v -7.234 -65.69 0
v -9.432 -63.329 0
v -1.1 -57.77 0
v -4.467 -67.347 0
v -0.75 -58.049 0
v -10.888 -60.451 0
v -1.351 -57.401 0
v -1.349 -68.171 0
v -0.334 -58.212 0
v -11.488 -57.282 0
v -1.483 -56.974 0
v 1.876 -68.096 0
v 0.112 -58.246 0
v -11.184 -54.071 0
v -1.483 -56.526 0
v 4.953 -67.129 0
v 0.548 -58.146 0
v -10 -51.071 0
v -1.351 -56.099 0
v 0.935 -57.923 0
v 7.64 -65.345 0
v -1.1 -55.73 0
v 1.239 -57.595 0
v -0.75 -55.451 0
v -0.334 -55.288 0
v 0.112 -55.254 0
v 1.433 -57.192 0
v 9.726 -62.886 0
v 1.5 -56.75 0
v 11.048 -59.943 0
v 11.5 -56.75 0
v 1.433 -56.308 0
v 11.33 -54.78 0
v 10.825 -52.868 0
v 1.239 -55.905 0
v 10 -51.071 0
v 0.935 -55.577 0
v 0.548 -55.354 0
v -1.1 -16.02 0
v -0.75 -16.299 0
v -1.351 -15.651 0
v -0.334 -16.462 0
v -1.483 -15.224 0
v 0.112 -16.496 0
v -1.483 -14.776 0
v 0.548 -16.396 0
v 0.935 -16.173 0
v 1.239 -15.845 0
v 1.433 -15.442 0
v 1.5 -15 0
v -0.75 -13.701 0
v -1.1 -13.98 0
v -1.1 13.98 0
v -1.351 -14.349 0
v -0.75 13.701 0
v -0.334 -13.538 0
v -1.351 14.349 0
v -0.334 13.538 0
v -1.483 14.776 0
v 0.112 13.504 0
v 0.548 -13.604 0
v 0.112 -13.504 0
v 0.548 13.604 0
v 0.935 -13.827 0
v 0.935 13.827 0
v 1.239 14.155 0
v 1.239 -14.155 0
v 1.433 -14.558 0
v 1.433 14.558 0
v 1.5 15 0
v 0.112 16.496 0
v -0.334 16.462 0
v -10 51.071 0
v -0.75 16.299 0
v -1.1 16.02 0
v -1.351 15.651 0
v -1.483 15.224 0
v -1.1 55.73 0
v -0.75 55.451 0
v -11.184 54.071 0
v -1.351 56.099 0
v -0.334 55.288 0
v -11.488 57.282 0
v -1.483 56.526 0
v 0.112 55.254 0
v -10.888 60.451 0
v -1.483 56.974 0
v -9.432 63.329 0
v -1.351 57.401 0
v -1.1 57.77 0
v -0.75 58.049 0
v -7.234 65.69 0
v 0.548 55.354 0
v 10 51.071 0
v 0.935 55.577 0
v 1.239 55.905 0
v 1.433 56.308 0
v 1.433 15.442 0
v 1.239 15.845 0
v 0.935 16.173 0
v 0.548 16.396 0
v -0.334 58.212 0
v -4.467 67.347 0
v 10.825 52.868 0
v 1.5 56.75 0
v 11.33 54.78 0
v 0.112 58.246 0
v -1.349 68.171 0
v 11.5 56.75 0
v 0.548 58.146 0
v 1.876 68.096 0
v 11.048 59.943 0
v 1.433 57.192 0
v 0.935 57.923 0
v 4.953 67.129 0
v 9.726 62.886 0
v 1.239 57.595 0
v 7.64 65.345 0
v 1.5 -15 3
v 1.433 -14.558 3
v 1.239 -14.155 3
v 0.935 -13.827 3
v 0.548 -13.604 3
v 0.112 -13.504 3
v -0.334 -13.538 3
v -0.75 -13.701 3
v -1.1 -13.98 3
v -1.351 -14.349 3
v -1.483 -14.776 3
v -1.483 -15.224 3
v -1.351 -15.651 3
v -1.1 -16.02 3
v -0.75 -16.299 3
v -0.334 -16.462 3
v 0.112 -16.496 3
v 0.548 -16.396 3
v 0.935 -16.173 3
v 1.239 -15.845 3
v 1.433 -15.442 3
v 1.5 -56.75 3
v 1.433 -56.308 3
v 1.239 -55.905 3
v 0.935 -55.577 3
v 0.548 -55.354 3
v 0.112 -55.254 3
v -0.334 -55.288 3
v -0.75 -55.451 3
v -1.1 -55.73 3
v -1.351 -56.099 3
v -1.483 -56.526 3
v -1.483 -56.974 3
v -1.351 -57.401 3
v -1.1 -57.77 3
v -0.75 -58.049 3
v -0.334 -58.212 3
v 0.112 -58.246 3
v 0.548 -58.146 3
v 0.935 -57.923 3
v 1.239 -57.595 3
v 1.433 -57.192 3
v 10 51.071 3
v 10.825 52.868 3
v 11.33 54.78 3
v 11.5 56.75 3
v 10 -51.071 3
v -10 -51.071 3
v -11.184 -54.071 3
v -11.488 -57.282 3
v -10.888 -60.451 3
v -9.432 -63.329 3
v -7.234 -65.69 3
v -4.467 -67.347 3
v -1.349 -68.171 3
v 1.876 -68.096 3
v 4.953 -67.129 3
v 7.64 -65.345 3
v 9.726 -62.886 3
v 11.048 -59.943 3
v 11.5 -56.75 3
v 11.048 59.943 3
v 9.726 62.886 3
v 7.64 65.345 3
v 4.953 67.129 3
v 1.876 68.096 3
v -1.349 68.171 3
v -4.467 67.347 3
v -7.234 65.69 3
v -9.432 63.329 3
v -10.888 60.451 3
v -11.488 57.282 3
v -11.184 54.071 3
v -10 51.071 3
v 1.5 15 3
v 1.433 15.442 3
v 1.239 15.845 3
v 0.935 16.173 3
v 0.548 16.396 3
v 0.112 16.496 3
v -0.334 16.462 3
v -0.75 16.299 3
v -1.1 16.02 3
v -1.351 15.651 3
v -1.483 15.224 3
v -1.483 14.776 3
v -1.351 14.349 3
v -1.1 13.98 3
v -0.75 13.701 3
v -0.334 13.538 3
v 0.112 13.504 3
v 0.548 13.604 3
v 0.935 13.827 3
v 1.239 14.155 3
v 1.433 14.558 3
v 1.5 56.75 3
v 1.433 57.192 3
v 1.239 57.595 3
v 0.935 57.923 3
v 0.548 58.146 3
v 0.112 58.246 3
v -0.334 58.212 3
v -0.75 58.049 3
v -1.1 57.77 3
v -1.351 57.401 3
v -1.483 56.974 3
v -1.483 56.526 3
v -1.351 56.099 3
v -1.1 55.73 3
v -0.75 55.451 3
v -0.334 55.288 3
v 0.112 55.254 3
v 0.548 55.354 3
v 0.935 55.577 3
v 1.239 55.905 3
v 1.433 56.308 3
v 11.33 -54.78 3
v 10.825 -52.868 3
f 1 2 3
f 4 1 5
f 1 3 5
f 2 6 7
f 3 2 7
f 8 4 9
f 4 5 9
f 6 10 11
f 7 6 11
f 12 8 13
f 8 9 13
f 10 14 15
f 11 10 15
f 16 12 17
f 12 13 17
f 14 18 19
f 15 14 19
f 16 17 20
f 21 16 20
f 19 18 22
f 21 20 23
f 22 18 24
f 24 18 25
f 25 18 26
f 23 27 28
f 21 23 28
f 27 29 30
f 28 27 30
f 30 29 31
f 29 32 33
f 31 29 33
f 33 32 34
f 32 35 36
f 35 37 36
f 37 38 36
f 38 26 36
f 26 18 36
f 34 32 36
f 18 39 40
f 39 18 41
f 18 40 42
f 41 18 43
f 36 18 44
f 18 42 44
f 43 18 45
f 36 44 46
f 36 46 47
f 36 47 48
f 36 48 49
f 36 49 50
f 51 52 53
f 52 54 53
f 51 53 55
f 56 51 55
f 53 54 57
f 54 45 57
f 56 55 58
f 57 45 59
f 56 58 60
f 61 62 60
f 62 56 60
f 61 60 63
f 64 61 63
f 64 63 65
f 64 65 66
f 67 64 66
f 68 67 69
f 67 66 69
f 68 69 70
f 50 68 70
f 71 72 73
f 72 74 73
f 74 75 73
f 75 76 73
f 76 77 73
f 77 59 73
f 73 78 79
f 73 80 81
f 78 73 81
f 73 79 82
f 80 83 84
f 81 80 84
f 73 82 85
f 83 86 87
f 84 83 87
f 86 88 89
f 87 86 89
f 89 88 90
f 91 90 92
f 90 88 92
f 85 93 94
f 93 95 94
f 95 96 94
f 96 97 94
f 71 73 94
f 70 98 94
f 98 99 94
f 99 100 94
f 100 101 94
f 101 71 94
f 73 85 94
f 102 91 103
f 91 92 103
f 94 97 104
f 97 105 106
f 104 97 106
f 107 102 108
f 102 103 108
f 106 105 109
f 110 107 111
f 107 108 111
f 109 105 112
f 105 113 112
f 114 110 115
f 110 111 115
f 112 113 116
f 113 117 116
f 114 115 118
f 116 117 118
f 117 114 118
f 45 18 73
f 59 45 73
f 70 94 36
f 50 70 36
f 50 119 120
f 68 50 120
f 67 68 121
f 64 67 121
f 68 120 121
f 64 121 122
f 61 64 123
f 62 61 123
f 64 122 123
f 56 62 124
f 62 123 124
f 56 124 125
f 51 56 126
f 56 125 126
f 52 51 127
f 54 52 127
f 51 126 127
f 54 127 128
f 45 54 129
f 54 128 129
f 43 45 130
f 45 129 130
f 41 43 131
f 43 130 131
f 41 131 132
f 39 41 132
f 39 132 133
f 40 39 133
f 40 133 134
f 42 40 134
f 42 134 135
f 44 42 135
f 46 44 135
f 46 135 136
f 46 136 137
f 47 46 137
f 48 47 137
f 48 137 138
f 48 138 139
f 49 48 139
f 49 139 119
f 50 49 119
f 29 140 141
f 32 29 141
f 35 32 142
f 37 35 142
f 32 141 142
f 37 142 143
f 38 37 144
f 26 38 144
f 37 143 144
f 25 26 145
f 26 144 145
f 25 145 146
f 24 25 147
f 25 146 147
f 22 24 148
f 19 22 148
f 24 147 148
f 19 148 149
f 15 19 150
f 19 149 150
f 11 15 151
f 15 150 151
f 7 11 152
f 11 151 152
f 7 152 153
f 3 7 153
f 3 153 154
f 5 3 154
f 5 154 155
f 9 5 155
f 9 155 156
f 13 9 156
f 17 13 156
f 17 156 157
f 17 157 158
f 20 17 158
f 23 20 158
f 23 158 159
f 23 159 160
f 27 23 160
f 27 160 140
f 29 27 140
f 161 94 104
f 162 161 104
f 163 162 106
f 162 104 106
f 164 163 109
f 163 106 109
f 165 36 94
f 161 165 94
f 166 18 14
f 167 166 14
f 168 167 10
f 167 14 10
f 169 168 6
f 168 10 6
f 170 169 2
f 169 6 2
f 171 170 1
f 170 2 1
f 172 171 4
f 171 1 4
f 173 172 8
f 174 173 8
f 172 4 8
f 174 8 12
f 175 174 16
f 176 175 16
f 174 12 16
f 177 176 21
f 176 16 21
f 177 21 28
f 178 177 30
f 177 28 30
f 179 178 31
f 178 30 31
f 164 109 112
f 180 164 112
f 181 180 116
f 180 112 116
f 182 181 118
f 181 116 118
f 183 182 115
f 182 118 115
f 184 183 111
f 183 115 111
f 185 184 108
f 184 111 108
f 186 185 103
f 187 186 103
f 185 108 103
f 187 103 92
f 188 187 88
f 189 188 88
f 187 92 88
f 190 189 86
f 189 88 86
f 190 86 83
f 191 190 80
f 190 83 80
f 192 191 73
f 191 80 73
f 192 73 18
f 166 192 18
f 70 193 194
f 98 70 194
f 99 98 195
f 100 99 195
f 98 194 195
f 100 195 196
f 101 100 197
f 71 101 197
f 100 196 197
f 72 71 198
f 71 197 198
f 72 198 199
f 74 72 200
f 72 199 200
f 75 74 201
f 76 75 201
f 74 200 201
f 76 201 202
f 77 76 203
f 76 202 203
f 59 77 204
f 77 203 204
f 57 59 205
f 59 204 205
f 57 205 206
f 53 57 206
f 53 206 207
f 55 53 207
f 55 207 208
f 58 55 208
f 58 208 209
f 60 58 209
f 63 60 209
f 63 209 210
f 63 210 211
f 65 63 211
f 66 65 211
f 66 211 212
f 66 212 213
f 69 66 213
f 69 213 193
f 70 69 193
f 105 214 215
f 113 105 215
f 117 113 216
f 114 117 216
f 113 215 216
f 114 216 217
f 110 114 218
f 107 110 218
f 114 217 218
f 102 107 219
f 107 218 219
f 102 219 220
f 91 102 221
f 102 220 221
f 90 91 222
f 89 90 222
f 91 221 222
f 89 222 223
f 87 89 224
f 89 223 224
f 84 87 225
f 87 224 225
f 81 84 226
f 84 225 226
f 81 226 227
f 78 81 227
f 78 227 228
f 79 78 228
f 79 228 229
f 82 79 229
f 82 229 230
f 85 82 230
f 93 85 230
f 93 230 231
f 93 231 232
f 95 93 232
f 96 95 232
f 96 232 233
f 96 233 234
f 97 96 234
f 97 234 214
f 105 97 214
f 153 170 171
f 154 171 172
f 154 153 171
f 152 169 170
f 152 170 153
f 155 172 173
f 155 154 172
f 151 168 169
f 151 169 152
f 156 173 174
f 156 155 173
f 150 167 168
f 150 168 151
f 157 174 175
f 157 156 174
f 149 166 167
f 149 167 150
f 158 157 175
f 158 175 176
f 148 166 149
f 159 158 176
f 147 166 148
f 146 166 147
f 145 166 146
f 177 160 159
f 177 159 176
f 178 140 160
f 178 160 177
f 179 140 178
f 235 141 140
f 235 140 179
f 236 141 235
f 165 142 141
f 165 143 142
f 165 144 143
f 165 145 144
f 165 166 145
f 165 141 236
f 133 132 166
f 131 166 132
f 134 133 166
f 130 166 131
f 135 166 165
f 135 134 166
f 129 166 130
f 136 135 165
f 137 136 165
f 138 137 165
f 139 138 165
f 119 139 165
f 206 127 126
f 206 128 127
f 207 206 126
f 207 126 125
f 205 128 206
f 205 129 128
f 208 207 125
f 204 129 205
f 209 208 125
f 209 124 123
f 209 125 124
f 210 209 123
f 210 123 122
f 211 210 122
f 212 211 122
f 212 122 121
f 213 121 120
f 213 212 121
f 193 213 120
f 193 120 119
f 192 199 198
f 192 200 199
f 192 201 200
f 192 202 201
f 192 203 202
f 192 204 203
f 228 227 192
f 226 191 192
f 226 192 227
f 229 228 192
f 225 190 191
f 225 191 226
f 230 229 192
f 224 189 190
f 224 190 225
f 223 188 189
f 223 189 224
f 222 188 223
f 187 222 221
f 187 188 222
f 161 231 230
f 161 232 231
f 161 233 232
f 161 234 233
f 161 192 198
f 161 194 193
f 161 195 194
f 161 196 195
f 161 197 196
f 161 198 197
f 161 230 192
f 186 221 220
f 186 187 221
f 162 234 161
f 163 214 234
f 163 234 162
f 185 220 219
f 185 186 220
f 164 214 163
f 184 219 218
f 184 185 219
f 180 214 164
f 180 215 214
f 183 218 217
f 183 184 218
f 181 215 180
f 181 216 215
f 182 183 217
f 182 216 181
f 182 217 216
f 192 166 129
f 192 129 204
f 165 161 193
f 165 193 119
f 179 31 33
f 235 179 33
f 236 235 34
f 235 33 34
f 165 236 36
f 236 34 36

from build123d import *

# Parameters (mm, degrees)
SALIENTE_EXTRUIR1_DEPTH = 3
CROQUIS2_R              = 1.5
CORTAR_EXTRUIR1_DEPTH   = 4


with BuildPart() as part:
    # Croquis1 → Saliente-Extruir1 (new body)
    with BuildSketch(Plane.XY):
        with BuildLine():
            ThreePointArc((-10, -51.071091654), (0, -45.25), (10, -51.071091654))
            Line((10, -51.071091654), (10, 51.071091654))
            ThreePointArc((10, 51.071091654), (0, 45.25), (-10, 51.071091654))
            Line((-10, 51.071091654), (-10, -51.071091654))
        make_face()
        with BuildLine():
            ThreePointArc((-10, 51.071091654), (0, 45.25), (10, 51.071091654))
            Line((10, 51.071091654), (10, 56.75))
            Line((10, 56.75), (-10, 56.75))
            Line((-10, 56.75), (-10, 51.071091654))
        make_face()
        with BuildLine():
            Line((10, 56.75), (10, 51.071091654))
            ThreePointArc((10, 51.071091654), (11.118677979, 53.813164969), (11.5, 56.75))
            ThreePointArc((11.5, 56.75), (-2.936835031, 67.868677979), (-10, 51.071091654))
            Line((-10, 51.071091654), (-10, 56.75))
            Line((-10, 56.75), (10, 56.75))
        make_face()
        with BuildLine():
            Line((10, -51.071091654), (10, -56.75))
            Line((10, -56.75), (-10, -56.75))
            Line((-10, -56.75), (-10, -51.071091654))
            ThreePointArc((-10, -51.071091654), (-2.936835031, -67.868677979), (11.5, -56.75))
            ThreePointArc((11.5, -56.75), (11.118677979, -53.813164969), (10, -51.071091654))
        make_face()
        with BuildLine():
            Line((-10, -56.75), (10, -56.75))
            Line((10, -56.75), (10, -51.071091654))
            ThreePointArc((10, -51.071091654), (0, -45.25), (-10, -51.071091654))
            Line((-10, -51.071091654), (-10, -56.75))
        make_face()
    extrude(amount=SALIENTE_EXTRUIR1_DEPTH)

    # Croquis2 → Cortar-Extruir1 (cut, through all)
    with BuildSketch(Plane.XY.offset(3)):
        with Locations((0, 15)):
            Circle(CROQUIS2_R)
        with Locations((0, -15)):
            Circle(CROQUIS2_R)
        with Locations((0, 56.75)):
            Circle(CROQUIS2_R)
        with Locations((0, -56.75)):
            Circle(CROQUIS2_R)
    extrude(amount=-CORTAR_EXTRUIR1_DEPTH, mode=Mode.SUBTRACT)


solid = part.part
